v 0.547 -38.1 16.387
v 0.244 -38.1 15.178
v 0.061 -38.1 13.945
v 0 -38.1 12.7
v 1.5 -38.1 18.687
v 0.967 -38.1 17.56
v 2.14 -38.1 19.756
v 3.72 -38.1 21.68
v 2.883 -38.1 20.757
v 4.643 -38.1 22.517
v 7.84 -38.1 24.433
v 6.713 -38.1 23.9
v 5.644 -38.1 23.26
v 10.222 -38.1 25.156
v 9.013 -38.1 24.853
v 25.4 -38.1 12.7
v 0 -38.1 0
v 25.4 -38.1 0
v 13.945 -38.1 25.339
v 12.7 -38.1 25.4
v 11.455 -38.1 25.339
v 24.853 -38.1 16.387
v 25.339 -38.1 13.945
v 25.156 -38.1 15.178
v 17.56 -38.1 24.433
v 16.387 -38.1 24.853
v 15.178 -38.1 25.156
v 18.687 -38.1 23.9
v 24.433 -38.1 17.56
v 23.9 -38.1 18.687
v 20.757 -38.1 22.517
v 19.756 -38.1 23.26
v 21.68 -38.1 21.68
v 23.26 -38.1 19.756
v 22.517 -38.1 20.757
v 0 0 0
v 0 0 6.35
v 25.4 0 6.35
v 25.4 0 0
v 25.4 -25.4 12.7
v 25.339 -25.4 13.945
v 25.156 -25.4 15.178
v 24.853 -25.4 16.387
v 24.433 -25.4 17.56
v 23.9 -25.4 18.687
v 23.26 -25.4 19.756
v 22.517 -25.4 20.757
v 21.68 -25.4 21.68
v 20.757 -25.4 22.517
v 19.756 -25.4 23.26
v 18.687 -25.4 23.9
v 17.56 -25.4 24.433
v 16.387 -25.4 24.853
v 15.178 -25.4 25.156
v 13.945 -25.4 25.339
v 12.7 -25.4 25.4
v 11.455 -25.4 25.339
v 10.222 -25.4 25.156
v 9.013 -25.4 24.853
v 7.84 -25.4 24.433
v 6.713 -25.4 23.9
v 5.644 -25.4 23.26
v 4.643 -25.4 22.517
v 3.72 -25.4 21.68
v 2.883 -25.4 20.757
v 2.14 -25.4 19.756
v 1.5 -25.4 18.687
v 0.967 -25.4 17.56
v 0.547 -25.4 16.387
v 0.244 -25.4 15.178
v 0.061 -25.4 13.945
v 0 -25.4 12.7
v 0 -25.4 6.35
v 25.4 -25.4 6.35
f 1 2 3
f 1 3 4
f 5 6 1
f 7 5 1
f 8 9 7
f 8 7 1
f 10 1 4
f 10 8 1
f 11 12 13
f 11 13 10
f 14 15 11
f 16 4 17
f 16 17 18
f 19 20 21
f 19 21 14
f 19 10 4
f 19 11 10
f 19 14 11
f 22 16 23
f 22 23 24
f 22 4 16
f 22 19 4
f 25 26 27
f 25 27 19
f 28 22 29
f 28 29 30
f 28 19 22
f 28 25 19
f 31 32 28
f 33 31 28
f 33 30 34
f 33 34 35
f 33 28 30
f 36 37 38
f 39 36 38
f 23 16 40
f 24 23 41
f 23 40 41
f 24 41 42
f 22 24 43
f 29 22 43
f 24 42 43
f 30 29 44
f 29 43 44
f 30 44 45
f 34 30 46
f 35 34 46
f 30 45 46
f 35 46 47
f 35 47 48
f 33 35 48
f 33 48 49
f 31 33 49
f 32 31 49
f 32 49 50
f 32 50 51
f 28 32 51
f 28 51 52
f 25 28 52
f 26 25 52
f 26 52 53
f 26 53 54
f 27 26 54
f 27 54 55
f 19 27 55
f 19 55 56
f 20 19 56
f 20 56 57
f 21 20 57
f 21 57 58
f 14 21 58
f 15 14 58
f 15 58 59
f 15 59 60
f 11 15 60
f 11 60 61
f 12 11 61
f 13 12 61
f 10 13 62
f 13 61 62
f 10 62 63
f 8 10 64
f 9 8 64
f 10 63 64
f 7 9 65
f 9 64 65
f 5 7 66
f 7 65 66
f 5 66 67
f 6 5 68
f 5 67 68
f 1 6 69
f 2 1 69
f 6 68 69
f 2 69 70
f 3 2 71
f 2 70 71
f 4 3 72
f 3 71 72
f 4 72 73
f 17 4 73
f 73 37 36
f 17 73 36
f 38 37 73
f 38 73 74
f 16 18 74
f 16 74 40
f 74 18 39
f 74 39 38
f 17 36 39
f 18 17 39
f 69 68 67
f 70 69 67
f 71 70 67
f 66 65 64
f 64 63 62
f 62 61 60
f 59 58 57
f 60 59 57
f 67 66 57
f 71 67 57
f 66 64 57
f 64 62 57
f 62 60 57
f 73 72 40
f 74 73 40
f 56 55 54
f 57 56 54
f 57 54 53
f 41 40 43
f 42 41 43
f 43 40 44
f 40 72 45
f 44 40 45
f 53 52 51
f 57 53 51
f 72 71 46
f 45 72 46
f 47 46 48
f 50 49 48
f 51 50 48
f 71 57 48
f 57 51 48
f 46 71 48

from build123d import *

# Parameters (mm, degrees)
F1_DEPTH = 38.1
F3_DEPTH = 25.4


with BuildPart() as f1:
    # F0 (on Front) → F1 (new body)
    with BuildSketch(Plane.XZ):
        with BuildLine():
            Line((0, 12.7), (0, 0))
            Line((0, 0), (25.4, 0))
            Line((25.4, 0), (25.4, 12.7))
            ThreePointArc((25.4, 12.7), (12.7, 25.4), (0, 12.7))
        make_face()
    extrude(amount=F1_DEPTH)

    # F2 (on Front) → F3 (cut)
    with BuildSketch(Plane.XZ):
        with BuildLine():
            Line((0, 12.7), (0, 6.35))
            Line((0, 6.35), (25.4, 6.35))
            Line((25.4, 6.35), (25.4, 12.7))
            ThreePointArc((25.4, 12.7), (12.7, 25.4), (0, 12.7))
        make_face()
    extrude(amount=F3_DEPTH, mode=Mode.SUBTRACT)


solid = f1.part
